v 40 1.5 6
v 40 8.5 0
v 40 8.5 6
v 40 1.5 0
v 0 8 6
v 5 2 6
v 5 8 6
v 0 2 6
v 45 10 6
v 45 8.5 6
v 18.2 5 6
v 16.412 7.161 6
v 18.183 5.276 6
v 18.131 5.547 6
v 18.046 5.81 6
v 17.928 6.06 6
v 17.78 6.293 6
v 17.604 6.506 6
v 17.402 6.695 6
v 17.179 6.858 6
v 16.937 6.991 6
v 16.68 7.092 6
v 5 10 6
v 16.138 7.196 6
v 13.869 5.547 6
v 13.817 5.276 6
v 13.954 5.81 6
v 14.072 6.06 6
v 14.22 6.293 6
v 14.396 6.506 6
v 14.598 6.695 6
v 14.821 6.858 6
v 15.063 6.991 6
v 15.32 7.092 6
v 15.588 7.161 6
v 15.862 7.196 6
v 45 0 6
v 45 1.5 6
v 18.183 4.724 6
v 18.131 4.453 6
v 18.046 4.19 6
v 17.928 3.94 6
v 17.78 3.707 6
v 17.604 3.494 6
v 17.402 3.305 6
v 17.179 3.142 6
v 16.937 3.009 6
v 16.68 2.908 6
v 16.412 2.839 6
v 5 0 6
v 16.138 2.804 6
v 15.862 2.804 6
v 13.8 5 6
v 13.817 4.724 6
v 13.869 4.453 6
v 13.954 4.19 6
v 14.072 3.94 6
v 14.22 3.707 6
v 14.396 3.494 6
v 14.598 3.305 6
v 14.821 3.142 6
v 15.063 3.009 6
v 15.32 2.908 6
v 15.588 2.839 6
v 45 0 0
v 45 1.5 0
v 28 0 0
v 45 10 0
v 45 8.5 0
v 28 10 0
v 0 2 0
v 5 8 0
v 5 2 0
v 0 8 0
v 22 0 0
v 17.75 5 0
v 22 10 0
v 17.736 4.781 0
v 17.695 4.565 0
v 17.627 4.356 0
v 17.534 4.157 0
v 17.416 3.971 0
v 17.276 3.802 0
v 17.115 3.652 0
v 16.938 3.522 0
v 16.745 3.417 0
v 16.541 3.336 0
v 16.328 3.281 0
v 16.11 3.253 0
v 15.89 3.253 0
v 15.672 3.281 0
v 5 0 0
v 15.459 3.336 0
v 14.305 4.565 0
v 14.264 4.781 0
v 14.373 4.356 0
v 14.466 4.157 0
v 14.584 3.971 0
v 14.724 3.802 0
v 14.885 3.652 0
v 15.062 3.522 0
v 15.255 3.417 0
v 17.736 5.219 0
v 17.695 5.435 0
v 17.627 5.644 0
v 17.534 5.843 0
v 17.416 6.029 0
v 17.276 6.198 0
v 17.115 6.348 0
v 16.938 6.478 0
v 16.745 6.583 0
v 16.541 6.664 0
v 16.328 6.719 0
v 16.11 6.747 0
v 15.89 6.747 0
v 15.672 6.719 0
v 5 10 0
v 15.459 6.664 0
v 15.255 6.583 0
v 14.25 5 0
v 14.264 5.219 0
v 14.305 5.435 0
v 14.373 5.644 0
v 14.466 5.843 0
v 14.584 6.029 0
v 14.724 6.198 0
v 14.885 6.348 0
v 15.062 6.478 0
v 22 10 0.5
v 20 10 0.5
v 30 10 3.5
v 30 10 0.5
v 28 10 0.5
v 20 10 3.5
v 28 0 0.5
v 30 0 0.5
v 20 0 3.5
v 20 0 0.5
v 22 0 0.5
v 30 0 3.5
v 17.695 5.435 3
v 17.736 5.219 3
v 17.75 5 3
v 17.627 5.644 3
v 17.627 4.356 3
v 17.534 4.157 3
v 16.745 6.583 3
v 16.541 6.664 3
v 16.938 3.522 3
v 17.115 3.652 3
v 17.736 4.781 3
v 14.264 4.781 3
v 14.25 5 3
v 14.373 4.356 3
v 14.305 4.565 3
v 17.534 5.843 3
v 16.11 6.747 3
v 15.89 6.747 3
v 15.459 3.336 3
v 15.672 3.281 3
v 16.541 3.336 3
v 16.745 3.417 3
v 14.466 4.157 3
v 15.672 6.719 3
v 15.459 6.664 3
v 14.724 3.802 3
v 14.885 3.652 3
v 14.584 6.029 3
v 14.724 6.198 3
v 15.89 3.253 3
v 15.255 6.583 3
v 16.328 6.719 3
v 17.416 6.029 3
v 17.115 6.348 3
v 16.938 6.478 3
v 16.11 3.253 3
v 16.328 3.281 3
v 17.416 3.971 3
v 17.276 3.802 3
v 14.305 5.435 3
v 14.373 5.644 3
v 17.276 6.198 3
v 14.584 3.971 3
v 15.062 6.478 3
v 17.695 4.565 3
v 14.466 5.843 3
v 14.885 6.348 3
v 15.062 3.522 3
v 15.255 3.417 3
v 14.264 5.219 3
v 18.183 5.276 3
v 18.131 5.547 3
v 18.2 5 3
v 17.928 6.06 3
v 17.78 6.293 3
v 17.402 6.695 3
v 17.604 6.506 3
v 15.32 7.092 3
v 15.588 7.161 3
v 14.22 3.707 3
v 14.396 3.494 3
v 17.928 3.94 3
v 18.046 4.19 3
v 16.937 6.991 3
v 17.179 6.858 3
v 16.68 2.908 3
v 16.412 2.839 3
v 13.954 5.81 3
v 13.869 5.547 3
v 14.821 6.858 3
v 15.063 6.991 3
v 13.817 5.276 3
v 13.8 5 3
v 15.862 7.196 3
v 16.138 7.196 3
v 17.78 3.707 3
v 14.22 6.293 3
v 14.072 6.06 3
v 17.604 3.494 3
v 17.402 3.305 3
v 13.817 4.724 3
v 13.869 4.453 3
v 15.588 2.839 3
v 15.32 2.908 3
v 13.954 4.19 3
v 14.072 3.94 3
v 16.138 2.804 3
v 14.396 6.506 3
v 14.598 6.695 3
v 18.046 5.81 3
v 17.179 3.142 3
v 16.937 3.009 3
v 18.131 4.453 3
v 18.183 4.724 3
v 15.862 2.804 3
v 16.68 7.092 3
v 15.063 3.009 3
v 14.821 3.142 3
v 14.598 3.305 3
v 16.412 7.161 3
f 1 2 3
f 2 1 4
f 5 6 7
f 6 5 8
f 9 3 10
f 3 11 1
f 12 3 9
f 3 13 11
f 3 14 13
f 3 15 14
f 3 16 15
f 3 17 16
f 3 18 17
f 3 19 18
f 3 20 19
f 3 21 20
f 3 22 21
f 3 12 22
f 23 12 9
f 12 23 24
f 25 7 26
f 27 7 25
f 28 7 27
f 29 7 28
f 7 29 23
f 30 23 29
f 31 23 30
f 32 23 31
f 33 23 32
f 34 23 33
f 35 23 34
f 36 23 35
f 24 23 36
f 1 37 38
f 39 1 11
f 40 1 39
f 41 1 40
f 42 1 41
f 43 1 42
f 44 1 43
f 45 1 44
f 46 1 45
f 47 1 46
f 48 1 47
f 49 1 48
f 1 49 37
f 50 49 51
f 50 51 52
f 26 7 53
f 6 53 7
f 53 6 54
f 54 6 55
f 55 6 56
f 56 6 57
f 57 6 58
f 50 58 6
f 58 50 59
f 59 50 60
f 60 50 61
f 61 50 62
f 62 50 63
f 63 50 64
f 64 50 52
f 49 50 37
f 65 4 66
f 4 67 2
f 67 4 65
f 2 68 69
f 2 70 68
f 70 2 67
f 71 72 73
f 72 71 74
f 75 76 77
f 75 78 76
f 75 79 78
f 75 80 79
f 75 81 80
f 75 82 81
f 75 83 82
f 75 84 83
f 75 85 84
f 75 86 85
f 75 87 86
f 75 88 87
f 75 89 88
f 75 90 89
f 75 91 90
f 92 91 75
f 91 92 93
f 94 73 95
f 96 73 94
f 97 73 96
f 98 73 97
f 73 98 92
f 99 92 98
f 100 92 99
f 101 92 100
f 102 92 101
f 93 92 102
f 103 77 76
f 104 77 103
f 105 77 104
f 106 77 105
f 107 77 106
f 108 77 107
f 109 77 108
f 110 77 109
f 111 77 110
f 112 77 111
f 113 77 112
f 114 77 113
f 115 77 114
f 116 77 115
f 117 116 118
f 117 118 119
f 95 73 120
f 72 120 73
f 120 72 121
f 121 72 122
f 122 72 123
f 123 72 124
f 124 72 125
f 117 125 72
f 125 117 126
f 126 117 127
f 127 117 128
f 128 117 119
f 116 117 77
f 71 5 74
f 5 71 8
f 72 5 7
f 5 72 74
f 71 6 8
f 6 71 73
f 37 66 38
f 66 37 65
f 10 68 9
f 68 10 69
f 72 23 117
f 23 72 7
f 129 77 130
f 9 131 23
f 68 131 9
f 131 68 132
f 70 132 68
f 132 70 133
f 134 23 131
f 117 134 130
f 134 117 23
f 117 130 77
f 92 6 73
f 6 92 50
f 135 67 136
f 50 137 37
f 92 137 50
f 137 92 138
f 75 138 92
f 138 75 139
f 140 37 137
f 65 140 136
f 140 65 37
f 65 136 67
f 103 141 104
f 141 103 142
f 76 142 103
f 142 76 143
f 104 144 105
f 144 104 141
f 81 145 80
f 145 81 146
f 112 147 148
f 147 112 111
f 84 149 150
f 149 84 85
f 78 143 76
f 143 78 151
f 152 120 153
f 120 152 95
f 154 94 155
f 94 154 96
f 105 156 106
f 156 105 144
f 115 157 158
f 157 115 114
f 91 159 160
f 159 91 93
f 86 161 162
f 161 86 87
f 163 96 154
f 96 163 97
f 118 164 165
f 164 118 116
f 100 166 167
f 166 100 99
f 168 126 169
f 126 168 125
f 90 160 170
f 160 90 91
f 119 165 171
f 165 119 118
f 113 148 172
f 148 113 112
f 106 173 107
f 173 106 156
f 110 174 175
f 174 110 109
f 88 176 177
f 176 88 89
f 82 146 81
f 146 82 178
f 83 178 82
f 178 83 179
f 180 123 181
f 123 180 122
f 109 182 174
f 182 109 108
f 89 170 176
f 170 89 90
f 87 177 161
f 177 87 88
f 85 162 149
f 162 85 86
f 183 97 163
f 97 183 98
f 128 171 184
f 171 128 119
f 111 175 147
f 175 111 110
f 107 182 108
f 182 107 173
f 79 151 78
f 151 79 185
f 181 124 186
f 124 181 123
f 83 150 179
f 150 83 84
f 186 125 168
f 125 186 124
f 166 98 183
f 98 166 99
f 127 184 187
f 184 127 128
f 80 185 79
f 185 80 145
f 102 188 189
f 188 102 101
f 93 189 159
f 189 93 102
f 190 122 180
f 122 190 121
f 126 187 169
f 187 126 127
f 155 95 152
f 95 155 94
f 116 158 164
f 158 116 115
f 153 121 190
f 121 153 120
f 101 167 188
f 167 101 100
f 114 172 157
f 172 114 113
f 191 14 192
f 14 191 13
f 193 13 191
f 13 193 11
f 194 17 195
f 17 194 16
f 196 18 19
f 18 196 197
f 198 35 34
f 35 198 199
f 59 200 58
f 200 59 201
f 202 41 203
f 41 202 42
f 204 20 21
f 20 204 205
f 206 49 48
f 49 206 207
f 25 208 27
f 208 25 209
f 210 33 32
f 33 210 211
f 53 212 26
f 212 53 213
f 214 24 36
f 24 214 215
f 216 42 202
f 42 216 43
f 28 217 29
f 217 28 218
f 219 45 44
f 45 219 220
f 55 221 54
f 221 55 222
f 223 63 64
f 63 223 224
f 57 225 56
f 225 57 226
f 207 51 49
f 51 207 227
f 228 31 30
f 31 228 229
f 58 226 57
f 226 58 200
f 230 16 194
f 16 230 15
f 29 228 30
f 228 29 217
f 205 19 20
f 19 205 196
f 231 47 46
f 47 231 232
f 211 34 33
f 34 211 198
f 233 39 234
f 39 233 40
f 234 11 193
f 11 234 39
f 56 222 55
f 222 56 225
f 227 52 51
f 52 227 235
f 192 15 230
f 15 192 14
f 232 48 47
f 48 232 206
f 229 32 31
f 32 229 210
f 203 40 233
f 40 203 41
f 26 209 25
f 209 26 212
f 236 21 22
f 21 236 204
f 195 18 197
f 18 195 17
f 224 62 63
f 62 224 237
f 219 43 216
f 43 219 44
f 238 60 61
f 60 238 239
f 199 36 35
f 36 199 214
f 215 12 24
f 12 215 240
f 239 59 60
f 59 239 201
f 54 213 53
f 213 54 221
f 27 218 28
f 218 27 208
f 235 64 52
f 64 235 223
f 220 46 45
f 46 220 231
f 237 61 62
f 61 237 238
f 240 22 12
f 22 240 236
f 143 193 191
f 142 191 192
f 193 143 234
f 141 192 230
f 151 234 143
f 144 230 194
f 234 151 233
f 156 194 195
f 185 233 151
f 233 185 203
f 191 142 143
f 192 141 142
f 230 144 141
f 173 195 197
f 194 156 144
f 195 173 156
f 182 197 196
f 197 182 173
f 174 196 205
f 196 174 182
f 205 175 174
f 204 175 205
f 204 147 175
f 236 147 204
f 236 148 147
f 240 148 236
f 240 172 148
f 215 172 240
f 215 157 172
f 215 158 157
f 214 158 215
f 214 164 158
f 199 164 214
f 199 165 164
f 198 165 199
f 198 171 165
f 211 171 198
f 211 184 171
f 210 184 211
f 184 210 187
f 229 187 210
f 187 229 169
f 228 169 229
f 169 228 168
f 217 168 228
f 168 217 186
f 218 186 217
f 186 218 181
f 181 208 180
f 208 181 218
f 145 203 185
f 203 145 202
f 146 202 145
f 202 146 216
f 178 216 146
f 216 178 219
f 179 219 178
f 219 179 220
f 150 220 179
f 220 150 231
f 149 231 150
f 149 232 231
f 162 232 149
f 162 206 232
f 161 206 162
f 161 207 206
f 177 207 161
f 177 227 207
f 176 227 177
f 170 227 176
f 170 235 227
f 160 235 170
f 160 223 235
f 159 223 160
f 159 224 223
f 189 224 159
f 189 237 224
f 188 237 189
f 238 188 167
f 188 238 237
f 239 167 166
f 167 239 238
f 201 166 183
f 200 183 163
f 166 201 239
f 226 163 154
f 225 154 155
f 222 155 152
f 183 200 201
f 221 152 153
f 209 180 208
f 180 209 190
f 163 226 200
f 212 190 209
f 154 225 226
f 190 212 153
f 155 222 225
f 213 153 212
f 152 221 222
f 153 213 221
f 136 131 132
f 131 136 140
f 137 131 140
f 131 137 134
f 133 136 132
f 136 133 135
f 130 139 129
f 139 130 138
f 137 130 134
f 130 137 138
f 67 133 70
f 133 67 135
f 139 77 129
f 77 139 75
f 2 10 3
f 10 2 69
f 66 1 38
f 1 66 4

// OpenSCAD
// Max height 270mm.
// Make 200mm height so 70mm bottom of box for raised
// area that will allow solvent to drain from part.
MaxHeight = 250;
MaxHeight = 70;
//MaxHeight = 35;

blockSize = 35; // 35mm (excludes key slot).

blockKeyWidth = 6;

blockDepth = 6;

$fn=50;

module ledGrip() {
    
                
    // LED strip holes
    translate([0,0,0.5]) {
        cube([10,10,3]);
    }

    // 2mm offset either side to keep hold of the LED.
    translate([2,0,0]) {
        cube([6,10,0.5]);
    }
}

// If multiple blocks use zero tollerance
// includeMiddleStripHolder - if holder for LED strip in the middle of the two main ones.
// i.e. for white LED strip between the two UV strips.
module block(blockCount, blockConnectTollerance, includeMiddleStripHolder) {

length = (blockCount * blockSize) + 5 ;

    difference() {
        union() {
            translate([0,2,0]) {
                cube ([length,blockKeyWidth,blockDepth]);
            }
            
            // Move down 10mm
            // Add outer blocks either side
            // to connect one segment to the next.
            translate([5,8,0]) {
                cube([length,2,blockDepth]);
            }
            
            translate([5,0,0]) {
                cube([length,2,blockDepth]);
            }
        }
        union() {
            
            for (offset = [16 : 35 : length]) {
            
                // Mounting holes
                translate([offset,5,0]) {
                    cylinder(d=3.5,h=blockDepth);
                    
                    // Large hole for head of screw
                    translate([0,0,3]) { 
                        cylinder(d=4.4,h=blockDepth-3);
                    }
                    
                }
            }
            
            // Holes to hold the LED strip in place.
            for (offset = [20 : 35 : length-10]) {
                translate([offset,0,0.0]) {
                    ledGrip();
                }
            }
            
            // for double strips, insert a middle
            //  
            if (includeMiddleStripHolder) {
                for (offset = [37.5 : 70 : length]) {
                    translate([offset,0,0.0]) {
                        ledGrip();
                    }
                }
            }
            
            // cut out a tiny bit extra from the open end to 
            // allow for variance in printing
            // Offset is 2mm either wide.
            translate([length,2 - blockConnectTollerance,0]) {
                // Allow 0.5mm spacing for key to fit.
                cube ([5,blockKeyWidth + (2* blockConnectTollerance),blockDepth]);
            }
        }
    }
}

//block(2, 0.5, true);
//block(2, 0.5, false);

block(1, 0.5, false);
